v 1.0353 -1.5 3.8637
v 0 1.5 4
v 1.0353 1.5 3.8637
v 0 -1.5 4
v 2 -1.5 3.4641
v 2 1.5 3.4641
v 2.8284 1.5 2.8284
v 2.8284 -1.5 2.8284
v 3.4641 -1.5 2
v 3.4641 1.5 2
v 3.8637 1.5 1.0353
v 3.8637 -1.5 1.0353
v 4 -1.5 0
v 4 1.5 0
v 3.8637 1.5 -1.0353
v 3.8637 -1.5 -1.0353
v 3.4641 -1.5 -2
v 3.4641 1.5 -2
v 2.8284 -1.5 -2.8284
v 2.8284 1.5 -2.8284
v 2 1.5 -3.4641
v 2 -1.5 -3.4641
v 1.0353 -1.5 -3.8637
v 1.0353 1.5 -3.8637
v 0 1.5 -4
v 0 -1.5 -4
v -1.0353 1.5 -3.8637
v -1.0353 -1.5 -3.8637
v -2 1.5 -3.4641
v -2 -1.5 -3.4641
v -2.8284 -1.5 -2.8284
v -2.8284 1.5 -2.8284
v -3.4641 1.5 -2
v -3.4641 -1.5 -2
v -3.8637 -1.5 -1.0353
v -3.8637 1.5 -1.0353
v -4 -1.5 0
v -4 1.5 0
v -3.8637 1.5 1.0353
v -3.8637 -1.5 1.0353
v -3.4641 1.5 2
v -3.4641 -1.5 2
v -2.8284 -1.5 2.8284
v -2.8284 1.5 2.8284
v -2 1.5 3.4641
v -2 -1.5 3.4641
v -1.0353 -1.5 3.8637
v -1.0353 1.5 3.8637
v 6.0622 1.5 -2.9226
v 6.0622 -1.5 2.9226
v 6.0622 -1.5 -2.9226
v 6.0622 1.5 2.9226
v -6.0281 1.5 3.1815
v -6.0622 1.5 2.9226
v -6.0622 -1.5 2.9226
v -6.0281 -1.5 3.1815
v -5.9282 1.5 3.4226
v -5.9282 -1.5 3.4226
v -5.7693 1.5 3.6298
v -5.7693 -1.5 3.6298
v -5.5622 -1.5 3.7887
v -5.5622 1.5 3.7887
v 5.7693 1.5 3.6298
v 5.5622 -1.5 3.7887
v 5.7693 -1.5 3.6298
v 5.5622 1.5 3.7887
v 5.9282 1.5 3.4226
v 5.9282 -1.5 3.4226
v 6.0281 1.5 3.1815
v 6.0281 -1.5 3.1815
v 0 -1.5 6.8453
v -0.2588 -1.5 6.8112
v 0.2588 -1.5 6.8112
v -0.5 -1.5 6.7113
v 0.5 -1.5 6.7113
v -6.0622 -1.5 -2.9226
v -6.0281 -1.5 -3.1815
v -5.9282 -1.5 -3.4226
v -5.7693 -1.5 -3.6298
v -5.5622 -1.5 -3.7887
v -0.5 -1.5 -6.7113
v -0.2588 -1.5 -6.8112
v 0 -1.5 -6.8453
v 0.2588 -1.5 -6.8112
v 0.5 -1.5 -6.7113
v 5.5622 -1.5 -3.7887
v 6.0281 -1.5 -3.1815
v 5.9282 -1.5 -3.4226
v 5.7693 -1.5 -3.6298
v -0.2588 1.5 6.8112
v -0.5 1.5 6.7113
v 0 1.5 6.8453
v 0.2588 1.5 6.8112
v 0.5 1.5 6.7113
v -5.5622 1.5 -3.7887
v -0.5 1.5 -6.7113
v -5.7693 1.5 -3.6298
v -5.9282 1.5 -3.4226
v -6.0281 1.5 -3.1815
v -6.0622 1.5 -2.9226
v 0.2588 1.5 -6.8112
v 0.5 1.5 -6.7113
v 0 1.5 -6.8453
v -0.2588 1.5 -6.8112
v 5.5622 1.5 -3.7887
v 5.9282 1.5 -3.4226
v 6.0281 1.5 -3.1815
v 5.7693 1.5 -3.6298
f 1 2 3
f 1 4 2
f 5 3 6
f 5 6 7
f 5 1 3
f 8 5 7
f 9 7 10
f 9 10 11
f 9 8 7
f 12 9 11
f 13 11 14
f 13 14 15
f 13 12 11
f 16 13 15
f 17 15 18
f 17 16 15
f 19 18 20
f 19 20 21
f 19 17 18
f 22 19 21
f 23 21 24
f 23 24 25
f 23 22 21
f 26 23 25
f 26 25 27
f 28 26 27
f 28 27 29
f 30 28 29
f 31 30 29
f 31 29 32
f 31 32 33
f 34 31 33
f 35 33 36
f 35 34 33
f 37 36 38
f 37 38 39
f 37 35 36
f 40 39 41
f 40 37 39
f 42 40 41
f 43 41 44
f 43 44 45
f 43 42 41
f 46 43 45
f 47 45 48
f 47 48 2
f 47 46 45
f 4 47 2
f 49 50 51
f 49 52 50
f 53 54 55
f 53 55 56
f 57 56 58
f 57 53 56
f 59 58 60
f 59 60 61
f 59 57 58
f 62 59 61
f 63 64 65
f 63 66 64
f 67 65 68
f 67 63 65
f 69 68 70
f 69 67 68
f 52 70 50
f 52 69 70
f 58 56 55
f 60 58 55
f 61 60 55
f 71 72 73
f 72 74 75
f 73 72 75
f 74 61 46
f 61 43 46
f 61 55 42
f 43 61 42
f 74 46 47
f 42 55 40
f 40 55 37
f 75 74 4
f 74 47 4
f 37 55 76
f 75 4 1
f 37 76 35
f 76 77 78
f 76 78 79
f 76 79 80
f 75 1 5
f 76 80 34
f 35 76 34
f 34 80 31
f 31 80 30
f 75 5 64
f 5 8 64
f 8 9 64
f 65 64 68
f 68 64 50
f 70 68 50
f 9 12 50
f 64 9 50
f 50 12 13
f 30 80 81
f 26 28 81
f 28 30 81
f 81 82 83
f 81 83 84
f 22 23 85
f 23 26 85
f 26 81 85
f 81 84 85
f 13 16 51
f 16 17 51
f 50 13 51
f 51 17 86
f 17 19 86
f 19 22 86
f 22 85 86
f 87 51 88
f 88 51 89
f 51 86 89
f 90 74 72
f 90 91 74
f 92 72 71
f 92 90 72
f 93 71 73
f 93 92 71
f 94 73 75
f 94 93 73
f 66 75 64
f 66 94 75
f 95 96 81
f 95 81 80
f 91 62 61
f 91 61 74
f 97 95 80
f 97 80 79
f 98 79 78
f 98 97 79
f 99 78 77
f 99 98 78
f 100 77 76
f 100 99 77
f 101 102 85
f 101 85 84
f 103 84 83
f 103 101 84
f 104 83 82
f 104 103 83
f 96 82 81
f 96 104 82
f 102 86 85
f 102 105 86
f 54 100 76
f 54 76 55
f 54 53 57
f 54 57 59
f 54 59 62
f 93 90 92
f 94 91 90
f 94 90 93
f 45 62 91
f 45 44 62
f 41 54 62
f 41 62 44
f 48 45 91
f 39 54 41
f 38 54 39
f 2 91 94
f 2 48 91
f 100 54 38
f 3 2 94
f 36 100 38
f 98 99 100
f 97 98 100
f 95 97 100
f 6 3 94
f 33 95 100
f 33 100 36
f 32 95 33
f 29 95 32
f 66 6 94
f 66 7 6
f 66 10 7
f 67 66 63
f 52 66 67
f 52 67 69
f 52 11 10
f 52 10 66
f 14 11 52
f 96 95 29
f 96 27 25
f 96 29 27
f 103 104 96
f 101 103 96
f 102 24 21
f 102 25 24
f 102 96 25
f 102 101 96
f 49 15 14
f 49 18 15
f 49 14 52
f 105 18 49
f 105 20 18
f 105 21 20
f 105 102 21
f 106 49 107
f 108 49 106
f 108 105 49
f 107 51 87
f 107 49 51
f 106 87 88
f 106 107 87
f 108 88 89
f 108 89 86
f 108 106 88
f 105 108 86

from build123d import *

# Parameters (mm, degrees)
SKETCH1_R           = 4
BOSS_EXTRUDE1_DEPTH = 1.5


with BuildPart() as part:
    # Sketch1 → Boss-Extrude1 (new, symmetric)
    with BuildSketch(Plane(origin=(0, 0, 0), x_dir=(1, 0, 0), z_dir=(0, 1, 0))):
        with BuildLine():
            Line((5.562177826, 3.788675135), (0.5, 6.711324865))
            ThreePointArc((0.5, 6.711324865), (0, 6.845299462), (-0.5, 6.711324865))
            Line((-0.5, 6.711324865), (-5.562177826, 3.788675135))
            ThreePointArc((-5.562177826, 3.788675135), (-5.92820323, 3.422649731), (-6.062177826, 2.922649731))
            Line((-6.062177826, 2.922649731), (-6.062177826, -2.922649731))
            ThreePointArc((-6.062177826, -2.922649731), (-5.92820323, -3.422649731), (-5.562177826, -3.788675135))
            Line((-5.562177826, -3.788675135), (-0.5, -6.711324865))
            ThreePointArc((-0.5, -6.711324865), (0, -6.845299462), (0.5, -6.711324865))
            Line((0.5, -6.711324865), (5.562177826, -3.788675135))
            ThreePointArc((5.562177826, -3.788675135), (5.92820323, -3.422649731), (6.062177826, -2.922649731))
            Line((6.062177826, -2.922649731), (6.062177826, 2.922649731))
            ThreePointArc((6.062177826, 2.922649731), (5.92820323, 3.422649731), (5.562177826, 3.788675135))
        make_face()
        with Locations(Location((0, 0, 0), (0, 0, 270))):
            Circle(SKETCH1_R, mode=Mode.SUBTRACT)
    extrude(amount=BOSS_EXTRUDE1_DEPTH, both=True)


solid = part.part
